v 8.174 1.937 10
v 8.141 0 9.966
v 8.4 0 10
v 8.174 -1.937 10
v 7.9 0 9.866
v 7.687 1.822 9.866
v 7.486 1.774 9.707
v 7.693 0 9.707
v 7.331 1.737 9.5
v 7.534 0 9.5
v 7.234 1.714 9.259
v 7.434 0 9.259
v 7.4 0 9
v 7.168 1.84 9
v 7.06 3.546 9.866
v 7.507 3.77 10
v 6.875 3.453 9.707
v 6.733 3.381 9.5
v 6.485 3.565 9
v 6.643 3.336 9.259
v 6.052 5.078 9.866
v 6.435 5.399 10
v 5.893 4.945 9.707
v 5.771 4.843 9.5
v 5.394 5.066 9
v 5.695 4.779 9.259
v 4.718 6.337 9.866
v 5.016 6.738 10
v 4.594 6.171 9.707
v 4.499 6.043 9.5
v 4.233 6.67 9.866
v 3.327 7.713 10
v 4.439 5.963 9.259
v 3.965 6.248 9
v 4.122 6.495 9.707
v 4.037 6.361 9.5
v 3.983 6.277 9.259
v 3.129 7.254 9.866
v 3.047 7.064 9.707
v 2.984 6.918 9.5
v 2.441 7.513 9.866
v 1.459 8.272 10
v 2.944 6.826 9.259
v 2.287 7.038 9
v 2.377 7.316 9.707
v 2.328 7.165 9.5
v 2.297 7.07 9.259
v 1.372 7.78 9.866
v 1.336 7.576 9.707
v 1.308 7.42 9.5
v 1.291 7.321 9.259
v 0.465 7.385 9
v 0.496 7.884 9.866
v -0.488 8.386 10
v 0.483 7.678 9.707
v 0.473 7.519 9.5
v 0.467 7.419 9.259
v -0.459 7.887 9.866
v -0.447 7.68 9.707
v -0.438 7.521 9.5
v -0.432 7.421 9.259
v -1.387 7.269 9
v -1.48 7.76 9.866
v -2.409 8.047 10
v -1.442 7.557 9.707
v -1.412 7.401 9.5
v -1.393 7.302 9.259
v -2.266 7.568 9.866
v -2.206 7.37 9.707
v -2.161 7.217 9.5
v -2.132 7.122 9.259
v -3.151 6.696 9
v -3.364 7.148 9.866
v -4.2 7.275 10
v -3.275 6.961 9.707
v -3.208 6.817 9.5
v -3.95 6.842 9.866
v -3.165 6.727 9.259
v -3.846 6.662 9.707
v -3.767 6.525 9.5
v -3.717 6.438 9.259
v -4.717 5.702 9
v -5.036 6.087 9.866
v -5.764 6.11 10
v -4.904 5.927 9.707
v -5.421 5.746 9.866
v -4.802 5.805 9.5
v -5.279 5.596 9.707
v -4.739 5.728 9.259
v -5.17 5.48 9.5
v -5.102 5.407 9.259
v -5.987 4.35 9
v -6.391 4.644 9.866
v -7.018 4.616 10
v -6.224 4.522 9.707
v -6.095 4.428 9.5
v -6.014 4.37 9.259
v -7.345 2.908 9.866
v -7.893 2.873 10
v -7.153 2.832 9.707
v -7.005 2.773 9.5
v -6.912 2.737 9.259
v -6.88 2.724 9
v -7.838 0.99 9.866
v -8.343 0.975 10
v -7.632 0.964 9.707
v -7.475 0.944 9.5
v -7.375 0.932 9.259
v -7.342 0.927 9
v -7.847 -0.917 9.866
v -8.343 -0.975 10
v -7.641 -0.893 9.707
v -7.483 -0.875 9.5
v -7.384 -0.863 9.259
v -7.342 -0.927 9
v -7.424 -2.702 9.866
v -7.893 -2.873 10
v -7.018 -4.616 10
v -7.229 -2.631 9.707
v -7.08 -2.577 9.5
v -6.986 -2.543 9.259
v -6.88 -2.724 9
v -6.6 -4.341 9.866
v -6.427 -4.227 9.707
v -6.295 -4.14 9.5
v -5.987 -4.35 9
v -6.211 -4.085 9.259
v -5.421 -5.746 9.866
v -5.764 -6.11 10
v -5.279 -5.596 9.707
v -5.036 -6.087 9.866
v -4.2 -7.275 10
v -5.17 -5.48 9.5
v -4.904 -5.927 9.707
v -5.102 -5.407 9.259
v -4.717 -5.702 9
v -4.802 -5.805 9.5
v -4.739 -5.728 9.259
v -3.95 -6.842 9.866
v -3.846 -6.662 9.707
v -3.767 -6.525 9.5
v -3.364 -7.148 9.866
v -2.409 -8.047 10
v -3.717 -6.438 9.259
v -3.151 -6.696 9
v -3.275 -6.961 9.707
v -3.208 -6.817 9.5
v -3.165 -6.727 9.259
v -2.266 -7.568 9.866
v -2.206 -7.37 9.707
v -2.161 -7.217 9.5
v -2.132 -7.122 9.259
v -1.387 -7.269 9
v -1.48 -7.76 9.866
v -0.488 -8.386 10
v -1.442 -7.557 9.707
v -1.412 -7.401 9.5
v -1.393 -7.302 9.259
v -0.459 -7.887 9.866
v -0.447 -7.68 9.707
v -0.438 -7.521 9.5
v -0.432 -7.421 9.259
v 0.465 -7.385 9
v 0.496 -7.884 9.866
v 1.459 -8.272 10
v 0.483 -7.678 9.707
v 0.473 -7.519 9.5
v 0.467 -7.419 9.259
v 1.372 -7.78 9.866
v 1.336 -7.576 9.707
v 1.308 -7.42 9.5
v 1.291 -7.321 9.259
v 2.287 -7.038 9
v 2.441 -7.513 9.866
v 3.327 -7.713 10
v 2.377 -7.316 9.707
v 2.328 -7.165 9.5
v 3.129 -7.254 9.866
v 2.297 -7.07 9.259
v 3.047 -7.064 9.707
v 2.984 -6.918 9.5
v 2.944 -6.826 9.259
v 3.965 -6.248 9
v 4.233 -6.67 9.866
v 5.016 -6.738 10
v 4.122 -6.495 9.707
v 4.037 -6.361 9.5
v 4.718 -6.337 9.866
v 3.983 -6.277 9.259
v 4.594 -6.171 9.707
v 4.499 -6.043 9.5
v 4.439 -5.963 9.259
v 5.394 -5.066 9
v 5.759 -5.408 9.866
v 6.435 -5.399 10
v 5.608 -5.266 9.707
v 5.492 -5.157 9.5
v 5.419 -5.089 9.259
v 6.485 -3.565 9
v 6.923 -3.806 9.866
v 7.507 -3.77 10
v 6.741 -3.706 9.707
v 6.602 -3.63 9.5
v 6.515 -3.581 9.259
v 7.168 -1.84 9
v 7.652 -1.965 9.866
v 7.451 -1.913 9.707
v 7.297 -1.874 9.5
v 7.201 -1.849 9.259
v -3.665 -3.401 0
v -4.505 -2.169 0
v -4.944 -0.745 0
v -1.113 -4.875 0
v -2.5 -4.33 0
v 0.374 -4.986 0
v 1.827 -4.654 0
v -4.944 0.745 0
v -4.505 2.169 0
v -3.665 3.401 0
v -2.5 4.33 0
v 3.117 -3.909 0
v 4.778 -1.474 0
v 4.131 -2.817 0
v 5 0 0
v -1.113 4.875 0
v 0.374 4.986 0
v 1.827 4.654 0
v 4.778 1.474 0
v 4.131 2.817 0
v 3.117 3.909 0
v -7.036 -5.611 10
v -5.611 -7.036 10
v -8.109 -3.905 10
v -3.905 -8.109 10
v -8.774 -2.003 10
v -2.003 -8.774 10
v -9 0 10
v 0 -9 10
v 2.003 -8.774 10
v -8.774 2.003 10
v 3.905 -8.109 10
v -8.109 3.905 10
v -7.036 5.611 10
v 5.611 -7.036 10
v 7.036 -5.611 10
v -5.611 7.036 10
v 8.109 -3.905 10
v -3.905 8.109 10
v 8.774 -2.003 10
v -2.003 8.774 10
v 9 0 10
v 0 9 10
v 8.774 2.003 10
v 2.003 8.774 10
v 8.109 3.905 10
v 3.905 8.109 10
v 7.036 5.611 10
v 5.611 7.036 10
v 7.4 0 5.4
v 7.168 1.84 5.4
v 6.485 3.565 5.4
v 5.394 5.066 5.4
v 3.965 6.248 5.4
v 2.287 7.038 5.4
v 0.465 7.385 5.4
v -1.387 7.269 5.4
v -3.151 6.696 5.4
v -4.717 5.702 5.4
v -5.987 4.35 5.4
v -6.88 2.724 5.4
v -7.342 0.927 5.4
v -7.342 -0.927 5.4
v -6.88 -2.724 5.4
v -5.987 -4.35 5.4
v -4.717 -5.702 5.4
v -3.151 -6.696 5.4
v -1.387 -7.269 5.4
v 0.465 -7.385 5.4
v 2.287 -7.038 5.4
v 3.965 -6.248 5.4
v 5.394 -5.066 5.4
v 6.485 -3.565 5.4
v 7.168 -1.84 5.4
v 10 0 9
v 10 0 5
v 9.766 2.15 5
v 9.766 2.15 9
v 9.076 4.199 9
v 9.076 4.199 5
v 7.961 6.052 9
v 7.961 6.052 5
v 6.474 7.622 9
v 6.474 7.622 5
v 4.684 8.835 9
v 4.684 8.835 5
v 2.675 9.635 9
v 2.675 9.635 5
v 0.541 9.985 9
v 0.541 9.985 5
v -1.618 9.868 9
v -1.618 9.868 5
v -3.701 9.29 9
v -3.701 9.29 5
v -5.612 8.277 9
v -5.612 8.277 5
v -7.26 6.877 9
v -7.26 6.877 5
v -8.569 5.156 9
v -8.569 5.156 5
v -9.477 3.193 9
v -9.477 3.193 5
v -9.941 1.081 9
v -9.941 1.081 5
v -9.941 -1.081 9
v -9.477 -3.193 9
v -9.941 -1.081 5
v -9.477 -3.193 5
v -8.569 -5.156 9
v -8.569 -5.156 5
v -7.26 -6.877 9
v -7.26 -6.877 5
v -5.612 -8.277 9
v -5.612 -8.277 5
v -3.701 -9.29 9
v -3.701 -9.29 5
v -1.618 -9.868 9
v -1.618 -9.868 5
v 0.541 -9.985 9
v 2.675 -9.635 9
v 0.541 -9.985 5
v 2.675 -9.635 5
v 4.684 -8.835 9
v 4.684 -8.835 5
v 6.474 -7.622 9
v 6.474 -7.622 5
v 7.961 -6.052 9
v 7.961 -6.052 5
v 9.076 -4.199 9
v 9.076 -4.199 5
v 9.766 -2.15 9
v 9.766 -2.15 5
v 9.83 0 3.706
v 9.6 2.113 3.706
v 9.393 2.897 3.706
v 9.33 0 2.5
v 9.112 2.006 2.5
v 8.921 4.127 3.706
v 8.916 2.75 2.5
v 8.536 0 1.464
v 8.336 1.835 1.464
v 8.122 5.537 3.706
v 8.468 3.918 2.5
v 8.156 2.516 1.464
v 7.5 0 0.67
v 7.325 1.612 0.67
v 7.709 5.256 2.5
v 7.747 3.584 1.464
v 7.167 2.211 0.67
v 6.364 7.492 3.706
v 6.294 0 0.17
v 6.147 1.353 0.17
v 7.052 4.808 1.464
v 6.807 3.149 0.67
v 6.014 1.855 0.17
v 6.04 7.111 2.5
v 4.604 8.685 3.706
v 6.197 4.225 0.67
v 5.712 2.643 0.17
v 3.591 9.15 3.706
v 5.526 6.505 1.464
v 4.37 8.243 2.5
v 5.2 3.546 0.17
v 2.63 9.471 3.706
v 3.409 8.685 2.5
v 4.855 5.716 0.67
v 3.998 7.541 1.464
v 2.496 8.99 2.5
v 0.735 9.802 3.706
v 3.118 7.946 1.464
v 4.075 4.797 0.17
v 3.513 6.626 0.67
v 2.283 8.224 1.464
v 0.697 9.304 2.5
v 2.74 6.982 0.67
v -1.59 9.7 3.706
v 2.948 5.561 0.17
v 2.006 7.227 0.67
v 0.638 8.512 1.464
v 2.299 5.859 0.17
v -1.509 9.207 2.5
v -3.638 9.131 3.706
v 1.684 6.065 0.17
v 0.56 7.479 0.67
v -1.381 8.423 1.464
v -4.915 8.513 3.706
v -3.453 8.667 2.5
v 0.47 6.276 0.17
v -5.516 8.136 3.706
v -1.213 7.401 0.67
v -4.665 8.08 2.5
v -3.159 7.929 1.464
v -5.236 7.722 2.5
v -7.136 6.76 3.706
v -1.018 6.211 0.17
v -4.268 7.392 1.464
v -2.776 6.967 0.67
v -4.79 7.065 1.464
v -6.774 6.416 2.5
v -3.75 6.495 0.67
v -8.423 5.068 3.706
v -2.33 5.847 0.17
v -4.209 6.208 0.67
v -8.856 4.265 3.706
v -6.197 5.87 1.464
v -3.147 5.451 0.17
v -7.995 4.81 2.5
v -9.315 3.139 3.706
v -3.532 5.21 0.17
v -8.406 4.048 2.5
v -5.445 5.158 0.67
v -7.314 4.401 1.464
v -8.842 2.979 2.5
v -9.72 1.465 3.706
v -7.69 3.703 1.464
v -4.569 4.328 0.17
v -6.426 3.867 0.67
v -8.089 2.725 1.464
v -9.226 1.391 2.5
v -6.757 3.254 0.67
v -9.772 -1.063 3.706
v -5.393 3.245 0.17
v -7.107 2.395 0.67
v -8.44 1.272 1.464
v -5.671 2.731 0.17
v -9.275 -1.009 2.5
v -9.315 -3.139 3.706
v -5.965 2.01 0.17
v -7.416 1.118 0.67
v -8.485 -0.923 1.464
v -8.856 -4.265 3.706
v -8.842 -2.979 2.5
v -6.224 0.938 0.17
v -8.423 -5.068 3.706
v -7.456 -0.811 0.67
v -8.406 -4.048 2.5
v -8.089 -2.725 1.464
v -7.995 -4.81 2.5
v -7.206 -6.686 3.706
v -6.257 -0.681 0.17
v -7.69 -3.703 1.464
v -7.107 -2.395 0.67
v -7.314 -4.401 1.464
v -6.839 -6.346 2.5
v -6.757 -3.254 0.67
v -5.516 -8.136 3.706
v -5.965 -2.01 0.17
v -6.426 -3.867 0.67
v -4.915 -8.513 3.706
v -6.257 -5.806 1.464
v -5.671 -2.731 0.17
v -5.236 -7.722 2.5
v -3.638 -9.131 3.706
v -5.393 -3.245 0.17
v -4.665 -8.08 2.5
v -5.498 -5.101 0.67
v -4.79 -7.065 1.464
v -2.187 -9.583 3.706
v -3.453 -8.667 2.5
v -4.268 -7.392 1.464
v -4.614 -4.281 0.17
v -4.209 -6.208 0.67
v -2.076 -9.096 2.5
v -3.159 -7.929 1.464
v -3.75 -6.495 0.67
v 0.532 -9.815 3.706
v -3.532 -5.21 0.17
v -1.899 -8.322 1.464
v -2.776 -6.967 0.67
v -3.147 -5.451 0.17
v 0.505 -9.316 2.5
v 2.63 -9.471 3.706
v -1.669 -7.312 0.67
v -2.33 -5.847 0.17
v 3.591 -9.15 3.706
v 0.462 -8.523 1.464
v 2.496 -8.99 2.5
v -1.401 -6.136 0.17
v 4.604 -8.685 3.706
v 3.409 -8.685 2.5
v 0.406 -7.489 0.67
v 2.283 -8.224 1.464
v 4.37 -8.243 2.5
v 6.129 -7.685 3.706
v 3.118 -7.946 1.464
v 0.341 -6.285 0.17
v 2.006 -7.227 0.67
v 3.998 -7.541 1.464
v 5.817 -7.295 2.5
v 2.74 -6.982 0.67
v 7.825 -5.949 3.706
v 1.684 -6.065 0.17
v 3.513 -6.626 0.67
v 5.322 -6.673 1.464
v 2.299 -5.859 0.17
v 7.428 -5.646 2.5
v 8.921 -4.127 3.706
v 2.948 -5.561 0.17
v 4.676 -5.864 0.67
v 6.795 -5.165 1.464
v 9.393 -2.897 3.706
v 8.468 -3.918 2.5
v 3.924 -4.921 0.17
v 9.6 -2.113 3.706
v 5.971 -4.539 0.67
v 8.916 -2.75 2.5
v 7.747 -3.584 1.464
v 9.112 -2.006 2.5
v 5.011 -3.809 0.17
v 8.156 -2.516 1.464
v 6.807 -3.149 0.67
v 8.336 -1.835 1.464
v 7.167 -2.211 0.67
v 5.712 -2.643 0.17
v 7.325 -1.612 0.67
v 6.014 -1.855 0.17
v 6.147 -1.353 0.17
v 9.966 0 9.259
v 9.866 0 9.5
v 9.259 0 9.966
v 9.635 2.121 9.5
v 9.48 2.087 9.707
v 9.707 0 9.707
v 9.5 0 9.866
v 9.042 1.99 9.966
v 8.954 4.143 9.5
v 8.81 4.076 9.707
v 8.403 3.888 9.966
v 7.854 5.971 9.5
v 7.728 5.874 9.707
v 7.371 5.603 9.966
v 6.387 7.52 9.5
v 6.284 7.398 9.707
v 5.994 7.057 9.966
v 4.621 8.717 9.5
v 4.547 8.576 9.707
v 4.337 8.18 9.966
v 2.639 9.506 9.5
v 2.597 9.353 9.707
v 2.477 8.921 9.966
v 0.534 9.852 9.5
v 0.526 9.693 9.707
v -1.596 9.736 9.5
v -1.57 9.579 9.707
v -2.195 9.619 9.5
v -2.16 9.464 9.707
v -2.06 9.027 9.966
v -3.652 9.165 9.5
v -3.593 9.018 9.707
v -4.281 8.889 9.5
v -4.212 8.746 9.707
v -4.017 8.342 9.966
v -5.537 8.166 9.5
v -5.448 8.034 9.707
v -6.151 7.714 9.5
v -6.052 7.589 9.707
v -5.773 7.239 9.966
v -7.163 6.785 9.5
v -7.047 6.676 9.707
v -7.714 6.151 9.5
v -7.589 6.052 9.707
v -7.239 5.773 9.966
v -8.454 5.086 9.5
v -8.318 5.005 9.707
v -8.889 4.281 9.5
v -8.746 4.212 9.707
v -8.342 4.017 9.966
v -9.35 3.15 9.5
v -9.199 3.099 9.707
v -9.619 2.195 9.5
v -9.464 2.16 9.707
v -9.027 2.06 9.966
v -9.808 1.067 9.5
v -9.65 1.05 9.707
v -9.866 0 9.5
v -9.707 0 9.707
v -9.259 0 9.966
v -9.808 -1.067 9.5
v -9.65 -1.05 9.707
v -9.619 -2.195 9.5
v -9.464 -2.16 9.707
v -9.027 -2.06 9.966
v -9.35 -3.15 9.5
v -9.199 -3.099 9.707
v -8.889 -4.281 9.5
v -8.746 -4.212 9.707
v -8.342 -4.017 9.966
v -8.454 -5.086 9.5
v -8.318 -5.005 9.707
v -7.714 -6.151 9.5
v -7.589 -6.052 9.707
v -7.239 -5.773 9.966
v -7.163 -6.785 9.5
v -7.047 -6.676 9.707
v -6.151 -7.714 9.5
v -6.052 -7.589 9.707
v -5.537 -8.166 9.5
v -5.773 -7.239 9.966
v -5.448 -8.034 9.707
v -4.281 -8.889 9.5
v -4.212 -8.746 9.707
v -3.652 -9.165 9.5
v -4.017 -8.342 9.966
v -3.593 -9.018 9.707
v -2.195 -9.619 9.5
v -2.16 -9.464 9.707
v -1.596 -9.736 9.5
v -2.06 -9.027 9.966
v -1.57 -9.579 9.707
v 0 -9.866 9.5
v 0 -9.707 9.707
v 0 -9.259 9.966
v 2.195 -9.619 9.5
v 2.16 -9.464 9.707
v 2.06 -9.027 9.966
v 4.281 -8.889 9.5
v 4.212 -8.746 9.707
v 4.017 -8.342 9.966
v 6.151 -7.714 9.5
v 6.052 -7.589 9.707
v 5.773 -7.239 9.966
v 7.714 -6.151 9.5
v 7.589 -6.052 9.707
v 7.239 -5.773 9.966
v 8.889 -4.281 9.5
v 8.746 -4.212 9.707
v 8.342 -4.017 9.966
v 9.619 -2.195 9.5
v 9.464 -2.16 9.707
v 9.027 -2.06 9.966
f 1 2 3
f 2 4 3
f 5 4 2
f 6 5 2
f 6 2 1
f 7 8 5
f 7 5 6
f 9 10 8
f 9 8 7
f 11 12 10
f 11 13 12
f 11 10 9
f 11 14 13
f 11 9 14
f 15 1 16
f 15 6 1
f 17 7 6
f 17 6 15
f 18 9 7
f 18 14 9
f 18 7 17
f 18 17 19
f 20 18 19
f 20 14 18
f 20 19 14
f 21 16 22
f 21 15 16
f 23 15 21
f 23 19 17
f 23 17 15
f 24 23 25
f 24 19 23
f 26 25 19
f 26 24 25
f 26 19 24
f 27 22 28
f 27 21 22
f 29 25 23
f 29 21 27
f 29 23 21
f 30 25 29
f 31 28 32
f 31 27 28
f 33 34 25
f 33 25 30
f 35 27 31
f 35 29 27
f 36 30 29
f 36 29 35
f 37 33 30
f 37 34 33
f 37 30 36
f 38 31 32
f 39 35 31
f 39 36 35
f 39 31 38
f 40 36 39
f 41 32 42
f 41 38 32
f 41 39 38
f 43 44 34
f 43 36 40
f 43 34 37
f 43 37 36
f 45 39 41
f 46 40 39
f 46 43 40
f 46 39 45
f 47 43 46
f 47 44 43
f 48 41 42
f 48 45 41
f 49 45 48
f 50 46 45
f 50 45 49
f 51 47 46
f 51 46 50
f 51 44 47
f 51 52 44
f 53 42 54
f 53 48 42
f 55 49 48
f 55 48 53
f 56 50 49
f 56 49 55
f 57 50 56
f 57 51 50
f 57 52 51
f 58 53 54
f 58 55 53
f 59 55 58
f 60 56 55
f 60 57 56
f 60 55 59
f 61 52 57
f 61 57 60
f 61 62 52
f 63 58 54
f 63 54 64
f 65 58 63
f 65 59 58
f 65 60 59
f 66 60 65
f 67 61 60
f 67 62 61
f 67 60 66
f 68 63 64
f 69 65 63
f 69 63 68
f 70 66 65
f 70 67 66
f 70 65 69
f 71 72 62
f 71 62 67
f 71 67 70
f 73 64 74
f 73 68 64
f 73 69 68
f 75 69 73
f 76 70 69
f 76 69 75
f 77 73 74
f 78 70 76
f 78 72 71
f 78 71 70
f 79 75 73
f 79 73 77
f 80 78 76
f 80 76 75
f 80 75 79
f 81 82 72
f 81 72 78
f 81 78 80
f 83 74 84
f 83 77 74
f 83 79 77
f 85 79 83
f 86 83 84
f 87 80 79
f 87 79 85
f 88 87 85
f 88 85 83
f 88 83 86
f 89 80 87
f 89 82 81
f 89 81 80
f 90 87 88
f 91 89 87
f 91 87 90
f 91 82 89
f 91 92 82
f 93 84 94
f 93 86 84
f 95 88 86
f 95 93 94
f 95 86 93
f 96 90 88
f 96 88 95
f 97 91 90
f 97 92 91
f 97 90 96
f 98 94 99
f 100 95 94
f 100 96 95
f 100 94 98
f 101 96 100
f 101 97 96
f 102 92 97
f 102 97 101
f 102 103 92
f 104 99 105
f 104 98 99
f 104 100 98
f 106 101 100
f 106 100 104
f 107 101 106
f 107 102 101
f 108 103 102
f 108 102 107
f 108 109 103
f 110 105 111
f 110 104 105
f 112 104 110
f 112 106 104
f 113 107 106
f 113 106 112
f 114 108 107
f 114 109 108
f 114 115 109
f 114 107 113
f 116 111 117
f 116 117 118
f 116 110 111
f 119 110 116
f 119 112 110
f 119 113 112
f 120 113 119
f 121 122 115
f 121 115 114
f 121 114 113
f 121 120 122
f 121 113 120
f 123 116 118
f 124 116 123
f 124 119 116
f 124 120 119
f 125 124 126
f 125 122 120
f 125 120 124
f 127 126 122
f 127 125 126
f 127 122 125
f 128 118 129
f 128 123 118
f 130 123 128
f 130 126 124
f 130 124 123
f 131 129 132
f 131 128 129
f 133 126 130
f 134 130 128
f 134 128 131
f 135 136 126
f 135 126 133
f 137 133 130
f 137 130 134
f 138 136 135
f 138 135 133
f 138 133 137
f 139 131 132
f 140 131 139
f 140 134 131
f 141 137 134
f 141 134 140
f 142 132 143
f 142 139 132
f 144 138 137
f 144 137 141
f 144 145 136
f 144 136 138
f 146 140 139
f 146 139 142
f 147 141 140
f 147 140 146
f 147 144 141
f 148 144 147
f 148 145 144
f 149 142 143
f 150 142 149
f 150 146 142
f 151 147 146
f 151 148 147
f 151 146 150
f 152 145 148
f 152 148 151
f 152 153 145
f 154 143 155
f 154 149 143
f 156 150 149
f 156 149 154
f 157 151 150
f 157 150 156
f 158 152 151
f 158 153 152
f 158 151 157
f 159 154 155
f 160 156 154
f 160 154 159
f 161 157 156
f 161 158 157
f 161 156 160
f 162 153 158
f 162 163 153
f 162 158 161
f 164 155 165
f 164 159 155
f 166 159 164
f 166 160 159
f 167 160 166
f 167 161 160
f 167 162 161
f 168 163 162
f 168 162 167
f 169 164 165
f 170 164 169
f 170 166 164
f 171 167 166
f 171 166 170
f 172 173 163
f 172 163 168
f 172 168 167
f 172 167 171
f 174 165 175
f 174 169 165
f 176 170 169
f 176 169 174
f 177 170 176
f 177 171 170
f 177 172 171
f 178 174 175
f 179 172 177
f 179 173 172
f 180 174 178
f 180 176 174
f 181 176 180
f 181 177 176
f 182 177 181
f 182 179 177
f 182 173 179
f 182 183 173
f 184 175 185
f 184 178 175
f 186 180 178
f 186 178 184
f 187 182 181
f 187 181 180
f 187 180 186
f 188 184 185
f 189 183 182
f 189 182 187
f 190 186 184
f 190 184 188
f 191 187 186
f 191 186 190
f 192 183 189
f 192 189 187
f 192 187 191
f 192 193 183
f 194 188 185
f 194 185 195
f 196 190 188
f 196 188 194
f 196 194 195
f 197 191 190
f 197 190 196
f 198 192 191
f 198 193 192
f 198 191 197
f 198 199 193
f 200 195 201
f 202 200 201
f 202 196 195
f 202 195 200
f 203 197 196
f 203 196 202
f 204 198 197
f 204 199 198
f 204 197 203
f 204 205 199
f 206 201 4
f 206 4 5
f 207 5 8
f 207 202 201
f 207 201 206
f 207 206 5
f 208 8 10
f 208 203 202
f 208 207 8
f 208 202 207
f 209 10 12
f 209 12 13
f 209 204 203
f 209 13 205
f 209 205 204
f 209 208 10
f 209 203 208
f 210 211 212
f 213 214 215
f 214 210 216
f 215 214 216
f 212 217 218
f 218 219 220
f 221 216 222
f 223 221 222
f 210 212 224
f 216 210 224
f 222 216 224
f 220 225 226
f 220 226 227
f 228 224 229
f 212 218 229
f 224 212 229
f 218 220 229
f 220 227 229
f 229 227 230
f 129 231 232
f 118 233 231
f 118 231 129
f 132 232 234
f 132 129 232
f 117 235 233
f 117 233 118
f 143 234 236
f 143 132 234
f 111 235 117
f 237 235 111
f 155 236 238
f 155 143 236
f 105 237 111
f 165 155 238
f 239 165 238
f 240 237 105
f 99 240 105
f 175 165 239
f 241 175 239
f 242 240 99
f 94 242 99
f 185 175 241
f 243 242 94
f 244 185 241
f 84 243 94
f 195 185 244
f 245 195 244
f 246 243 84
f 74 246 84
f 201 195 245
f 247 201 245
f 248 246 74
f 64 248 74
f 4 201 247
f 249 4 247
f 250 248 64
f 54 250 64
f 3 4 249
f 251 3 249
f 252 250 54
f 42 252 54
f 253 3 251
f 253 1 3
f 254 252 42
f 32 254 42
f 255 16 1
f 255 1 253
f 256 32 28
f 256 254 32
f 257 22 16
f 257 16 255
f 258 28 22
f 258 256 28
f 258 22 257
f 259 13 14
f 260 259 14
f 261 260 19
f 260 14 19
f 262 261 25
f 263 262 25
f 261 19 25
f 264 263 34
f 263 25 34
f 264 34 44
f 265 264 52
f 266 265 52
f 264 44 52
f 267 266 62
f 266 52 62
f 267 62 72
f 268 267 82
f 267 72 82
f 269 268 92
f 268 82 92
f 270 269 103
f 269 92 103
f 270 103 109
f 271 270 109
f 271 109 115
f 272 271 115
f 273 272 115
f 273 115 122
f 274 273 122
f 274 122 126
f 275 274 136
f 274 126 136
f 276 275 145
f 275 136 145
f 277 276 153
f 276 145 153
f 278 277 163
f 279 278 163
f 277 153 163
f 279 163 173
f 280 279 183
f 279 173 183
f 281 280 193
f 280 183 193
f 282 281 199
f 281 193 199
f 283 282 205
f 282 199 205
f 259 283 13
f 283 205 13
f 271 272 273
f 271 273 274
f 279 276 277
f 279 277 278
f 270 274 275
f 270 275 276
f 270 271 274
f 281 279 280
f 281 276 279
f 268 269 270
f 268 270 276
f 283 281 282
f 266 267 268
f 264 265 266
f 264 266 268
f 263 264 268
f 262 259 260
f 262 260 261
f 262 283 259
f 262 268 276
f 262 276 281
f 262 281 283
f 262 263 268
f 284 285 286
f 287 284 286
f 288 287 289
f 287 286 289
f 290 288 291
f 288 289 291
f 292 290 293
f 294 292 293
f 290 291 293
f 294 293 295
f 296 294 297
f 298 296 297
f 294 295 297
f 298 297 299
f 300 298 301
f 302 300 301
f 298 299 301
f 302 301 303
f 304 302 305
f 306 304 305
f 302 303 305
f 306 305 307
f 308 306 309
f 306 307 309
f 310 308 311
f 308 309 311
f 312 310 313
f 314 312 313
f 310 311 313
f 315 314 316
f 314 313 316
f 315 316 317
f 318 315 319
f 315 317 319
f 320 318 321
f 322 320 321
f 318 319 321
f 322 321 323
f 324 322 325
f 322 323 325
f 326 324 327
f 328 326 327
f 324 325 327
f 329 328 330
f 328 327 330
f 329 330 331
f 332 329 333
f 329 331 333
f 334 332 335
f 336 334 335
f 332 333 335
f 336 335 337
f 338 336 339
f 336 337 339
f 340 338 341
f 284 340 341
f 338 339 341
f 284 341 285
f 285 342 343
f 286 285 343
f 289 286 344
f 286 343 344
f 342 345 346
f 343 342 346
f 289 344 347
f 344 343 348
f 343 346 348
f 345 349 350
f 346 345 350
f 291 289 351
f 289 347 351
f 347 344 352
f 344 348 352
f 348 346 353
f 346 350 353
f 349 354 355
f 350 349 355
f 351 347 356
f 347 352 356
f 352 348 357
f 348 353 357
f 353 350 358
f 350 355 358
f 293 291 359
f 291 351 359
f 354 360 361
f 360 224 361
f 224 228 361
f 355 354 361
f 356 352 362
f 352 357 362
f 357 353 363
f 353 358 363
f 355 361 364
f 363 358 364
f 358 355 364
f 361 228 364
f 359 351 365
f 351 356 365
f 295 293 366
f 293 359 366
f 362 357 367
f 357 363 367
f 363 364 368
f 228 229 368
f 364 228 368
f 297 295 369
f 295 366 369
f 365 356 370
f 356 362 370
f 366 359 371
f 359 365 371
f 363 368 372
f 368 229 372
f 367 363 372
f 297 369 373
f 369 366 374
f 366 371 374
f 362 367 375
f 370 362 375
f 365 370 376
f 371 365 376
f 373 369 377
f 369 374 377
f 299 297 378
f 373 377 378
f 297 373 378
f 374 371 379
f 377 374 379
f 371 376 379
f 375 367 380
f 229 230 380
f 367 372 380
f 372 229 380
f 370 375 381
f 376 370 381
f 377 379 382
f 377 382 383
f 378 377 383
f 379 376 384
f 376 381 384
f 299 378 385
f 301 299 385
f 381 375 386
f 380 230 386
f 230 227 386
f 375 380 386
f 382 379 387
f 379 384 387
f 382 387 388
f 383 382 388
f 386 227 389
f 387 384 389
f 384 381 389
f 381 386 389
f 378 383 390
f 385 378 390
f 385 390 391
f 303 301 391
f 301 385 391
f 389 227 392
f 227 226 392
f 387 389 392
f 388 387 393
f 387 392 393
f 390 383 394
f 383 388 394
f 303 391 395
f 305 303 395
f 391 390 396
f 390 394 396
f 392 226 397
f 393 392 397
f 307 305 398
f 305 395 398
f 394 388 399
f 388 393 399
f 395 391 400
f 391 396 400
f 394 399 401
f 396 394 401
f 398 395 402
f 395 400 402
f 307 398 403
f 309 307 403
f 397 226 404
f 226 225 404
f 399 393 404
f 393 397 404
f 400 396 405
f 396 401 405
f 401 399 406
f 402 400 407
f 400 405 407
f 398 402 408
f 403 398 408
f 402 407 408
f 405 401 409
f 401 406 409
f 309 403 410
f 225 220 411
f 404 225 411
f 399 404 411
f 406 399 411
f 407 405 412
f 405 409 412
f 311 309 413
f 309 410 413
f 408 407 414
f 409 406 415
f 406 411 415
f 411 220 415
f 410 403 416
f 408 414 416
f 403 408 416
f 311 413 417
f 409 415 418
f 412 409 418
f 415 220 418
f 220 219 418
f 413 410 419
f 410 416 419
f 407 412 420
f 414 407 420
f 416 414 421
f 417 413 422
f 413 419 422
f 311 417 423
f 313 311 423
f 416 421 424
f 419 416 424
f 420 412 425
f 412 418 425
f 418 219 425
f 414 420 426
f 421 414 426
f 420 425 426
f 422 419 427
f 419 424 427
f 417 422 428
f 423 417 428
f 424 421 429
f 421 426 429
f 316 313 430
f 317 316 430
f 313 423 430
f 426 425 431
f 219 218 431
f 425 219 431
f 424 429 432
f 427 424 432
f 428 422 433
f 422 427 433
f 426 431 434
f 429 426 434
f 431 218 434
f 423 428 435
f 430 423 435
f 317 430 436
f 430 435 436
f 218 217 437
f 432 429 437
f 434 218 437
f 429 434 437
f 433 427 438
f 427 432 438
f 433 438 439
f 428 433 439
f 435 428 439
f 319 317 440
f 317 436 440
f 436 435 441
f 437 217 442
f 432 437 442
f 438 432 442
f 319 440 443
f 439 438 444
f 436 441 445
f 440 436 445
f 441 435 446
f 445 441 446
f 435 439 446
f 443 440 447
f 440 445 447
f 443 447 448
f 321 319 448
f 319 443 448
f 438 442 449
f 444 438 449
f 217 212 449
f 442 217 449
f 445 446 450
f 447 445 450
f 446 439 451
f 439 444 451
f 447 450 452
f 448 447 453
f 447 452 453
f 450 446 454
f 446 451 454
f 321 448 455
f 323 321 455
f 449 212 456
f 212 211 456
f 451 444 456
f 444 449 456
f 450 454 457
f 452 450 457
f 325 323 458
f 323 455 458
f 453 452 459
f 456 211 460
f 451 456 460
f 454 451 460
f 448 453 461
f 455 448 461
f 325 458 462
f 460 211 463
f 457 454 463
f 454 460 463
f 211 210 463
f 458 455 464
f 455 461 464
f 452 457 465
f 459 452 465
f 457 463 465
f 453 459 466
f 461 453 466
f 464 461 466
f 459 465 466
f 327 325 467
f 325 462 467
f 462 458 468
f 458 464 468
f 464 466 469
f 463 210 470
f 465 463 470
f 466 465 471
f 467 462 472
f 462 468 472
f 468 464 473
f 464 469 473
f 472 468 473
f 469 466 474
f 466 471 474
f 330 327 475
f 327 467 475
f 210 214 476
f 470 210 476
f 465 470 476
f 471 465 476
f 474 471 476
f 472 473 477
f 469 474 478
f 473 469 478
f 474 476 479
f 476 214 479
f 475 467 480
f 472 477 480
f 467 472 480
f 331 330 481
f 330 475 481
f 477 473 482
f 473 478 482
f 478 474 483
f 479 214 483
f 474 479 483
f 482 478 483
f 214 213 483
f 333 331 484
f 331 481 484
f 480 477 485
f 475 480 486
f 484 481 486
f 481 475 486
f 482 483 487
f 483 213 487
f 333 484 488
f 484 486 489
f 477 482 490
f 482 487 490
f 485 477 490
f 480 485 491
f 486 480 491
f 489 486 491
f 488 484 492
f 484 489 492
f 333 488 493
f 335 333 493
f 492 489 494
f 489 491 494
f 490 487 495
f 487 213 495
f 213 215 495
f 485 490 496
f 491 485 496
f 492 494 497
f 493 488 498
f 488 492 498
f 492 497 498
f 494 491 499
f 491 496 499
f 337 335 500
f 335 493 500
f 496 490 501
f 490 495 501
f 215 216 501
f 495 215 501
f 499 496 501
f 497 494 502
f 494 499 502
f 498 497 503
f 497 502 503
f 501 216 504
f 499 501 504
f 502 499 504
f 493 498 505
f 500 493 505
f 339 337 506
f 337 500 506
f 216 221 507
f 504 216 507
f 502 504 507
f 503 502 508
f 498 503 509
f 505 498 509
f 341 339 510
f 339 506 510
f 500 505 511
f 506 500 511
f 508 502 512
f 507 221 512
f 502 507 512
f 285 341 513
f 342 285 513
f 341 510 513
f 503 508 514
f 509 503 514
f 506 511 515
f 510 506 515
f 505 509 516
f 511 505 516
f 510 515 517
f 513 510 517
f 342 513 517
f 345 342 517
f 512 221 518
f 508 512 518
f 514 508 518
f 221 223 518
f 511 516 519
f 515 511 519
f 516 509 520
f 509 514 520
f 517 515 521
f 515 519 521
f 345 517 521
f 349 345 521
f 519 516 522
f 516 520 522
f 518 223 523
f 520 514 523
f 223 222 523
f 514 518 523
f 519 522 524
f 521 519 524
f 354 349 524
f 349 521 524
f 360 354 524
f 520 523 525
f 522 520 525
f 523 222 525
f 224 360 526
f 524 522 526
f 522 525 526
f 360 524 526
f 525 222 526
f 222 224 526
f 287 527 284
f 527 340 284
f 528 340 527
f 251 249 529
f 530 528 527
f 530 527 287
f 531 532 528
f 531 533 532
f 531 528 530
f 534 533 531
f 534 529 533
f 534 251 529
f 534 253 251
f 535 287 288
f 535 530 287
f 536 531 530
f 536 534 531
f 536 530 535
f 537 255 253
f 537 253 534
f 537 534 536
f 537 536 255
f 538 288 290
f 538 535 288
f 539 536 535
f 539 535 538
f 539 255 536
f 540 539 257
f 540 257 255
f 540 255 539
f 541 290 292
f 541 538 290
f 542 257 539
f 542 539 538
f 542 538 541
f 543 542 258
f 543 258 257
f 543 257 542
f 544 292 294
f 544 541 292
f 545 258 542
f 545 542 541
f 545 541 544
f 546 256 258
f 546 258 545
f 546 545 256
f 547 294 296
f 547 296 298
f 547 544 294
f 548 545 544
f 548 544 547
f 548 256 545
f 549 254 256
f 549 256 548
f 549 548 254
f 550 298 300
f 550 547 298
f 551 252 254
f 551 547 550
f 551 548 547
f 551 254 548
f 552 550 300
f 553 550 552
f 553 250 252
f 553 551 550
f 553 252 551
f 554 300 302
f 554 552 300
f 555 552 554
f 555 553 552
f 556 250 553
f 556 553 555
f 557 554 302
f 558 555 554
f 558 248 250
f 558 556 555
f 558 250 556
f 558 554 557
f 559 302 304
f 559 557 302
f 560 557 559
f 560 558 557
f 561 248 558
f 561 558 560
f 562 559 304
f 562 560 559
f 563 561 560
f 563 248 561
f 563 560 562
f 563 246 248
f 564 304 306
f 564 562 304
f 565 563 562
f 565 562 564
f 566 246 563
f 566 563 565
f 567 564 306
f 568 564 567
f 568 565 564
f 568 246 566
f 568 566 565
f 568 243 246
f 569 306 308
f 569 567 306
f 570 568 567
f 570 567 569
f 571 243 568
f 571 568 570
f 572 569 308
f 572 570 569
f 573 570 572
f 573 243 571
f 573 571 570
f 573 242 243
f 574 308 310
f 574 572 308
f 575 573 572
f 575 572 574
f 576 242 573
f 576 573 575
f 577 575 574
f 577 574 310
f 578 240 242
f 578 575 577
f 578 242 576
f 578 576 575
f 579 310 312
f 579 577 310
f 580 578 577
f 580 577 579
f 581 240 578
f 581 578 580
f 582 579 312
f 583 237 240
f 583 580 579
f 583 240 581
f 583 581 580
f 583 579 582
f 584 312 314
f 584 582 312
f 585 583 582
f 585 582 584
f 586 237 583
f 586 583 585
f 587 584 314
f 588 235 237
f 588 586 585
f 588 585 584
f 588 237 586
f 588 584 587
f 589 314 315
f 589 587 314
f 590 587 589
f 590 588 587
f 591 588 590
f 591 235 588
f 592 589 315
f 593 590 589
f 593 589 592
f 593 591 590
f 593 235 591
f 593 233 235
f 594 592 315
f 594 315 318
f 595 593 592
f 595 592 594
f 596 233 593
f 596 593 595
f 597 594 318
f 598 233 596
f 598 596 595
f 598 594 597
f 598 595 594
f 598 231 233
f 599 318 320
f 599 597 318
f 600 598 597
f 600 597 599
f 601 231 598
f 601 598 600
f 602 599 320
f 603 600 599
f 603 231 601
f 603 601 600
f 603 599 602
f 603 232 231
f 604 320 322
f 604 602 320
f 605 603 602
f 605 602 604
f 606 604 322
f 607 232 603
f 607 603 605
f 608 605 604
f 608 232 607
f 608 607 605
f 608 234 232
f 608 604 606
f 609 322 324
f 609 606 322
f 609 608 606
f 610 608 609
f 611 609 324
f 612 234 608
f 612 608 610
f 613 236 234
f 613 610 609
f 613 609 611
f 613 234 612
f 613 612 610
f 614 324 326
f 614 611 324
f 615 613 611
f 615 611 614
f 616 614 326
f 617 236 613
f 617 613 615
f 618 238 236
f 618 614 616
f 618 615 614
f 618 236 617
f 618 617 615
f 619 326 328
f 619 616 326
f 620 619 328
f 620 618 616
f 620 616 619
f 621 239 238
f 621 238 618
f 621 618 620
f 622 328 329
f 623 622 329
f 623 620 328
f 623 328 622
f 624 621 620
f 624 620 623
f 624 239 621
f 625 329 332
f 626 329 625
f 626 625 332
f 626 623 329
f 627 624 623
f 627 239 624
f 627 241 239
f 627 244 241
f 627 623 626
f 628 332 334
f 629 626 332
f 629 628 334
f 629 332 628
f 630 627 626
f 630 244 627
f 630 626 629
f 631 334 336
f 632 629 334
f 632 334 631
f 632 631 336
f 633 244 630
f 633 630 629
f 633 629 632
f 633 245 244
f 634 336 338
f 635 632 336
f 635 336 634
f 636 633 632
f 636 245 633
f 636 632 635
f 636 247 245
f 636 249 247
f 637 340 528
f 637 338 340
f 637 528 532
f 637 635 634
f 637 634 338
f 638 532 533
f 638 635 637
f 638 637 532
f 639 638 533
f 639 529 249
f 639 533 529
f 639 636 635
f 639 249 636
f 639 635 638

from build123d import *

# Parameters (mm, degrees)
F0_R     = 10
F1_DEPTH = 10
F2_R     = 7.4
F3_DEPTH = 4.6
F4_R     = 5
F5_R     = 1


with BuildPart() as f1:
    # F0 (on Top) → F1 (new body)
    with BuildSketch(Plane.XY):
        Circle(F0_R)
    extrude(amount=F1_DEPTH)

    # F2 (on face) → F3 (cut)
    with BuildSketch(Plane.XY.offset(10)):
        Circle(F2_R)
    extrude(amount=-F3_DEPTH, mode=Mode.SUBTRACT)

    # F4
    f4_edges = [f1.edges().sort_by_distance(p)[0] for p in [
        (-10, 0, 0),
    ]]
    fillet(f4_edges, radius=F4_R)

    # F5
    f5_edges = [f1.edges().sort_by_distance(p)[0] for p in [
        (-7.4, 0, 10),
        (-10, 0, 10),
    ]]
    fillet(f5_edges, radius=F5_R)


solid = f1.part
